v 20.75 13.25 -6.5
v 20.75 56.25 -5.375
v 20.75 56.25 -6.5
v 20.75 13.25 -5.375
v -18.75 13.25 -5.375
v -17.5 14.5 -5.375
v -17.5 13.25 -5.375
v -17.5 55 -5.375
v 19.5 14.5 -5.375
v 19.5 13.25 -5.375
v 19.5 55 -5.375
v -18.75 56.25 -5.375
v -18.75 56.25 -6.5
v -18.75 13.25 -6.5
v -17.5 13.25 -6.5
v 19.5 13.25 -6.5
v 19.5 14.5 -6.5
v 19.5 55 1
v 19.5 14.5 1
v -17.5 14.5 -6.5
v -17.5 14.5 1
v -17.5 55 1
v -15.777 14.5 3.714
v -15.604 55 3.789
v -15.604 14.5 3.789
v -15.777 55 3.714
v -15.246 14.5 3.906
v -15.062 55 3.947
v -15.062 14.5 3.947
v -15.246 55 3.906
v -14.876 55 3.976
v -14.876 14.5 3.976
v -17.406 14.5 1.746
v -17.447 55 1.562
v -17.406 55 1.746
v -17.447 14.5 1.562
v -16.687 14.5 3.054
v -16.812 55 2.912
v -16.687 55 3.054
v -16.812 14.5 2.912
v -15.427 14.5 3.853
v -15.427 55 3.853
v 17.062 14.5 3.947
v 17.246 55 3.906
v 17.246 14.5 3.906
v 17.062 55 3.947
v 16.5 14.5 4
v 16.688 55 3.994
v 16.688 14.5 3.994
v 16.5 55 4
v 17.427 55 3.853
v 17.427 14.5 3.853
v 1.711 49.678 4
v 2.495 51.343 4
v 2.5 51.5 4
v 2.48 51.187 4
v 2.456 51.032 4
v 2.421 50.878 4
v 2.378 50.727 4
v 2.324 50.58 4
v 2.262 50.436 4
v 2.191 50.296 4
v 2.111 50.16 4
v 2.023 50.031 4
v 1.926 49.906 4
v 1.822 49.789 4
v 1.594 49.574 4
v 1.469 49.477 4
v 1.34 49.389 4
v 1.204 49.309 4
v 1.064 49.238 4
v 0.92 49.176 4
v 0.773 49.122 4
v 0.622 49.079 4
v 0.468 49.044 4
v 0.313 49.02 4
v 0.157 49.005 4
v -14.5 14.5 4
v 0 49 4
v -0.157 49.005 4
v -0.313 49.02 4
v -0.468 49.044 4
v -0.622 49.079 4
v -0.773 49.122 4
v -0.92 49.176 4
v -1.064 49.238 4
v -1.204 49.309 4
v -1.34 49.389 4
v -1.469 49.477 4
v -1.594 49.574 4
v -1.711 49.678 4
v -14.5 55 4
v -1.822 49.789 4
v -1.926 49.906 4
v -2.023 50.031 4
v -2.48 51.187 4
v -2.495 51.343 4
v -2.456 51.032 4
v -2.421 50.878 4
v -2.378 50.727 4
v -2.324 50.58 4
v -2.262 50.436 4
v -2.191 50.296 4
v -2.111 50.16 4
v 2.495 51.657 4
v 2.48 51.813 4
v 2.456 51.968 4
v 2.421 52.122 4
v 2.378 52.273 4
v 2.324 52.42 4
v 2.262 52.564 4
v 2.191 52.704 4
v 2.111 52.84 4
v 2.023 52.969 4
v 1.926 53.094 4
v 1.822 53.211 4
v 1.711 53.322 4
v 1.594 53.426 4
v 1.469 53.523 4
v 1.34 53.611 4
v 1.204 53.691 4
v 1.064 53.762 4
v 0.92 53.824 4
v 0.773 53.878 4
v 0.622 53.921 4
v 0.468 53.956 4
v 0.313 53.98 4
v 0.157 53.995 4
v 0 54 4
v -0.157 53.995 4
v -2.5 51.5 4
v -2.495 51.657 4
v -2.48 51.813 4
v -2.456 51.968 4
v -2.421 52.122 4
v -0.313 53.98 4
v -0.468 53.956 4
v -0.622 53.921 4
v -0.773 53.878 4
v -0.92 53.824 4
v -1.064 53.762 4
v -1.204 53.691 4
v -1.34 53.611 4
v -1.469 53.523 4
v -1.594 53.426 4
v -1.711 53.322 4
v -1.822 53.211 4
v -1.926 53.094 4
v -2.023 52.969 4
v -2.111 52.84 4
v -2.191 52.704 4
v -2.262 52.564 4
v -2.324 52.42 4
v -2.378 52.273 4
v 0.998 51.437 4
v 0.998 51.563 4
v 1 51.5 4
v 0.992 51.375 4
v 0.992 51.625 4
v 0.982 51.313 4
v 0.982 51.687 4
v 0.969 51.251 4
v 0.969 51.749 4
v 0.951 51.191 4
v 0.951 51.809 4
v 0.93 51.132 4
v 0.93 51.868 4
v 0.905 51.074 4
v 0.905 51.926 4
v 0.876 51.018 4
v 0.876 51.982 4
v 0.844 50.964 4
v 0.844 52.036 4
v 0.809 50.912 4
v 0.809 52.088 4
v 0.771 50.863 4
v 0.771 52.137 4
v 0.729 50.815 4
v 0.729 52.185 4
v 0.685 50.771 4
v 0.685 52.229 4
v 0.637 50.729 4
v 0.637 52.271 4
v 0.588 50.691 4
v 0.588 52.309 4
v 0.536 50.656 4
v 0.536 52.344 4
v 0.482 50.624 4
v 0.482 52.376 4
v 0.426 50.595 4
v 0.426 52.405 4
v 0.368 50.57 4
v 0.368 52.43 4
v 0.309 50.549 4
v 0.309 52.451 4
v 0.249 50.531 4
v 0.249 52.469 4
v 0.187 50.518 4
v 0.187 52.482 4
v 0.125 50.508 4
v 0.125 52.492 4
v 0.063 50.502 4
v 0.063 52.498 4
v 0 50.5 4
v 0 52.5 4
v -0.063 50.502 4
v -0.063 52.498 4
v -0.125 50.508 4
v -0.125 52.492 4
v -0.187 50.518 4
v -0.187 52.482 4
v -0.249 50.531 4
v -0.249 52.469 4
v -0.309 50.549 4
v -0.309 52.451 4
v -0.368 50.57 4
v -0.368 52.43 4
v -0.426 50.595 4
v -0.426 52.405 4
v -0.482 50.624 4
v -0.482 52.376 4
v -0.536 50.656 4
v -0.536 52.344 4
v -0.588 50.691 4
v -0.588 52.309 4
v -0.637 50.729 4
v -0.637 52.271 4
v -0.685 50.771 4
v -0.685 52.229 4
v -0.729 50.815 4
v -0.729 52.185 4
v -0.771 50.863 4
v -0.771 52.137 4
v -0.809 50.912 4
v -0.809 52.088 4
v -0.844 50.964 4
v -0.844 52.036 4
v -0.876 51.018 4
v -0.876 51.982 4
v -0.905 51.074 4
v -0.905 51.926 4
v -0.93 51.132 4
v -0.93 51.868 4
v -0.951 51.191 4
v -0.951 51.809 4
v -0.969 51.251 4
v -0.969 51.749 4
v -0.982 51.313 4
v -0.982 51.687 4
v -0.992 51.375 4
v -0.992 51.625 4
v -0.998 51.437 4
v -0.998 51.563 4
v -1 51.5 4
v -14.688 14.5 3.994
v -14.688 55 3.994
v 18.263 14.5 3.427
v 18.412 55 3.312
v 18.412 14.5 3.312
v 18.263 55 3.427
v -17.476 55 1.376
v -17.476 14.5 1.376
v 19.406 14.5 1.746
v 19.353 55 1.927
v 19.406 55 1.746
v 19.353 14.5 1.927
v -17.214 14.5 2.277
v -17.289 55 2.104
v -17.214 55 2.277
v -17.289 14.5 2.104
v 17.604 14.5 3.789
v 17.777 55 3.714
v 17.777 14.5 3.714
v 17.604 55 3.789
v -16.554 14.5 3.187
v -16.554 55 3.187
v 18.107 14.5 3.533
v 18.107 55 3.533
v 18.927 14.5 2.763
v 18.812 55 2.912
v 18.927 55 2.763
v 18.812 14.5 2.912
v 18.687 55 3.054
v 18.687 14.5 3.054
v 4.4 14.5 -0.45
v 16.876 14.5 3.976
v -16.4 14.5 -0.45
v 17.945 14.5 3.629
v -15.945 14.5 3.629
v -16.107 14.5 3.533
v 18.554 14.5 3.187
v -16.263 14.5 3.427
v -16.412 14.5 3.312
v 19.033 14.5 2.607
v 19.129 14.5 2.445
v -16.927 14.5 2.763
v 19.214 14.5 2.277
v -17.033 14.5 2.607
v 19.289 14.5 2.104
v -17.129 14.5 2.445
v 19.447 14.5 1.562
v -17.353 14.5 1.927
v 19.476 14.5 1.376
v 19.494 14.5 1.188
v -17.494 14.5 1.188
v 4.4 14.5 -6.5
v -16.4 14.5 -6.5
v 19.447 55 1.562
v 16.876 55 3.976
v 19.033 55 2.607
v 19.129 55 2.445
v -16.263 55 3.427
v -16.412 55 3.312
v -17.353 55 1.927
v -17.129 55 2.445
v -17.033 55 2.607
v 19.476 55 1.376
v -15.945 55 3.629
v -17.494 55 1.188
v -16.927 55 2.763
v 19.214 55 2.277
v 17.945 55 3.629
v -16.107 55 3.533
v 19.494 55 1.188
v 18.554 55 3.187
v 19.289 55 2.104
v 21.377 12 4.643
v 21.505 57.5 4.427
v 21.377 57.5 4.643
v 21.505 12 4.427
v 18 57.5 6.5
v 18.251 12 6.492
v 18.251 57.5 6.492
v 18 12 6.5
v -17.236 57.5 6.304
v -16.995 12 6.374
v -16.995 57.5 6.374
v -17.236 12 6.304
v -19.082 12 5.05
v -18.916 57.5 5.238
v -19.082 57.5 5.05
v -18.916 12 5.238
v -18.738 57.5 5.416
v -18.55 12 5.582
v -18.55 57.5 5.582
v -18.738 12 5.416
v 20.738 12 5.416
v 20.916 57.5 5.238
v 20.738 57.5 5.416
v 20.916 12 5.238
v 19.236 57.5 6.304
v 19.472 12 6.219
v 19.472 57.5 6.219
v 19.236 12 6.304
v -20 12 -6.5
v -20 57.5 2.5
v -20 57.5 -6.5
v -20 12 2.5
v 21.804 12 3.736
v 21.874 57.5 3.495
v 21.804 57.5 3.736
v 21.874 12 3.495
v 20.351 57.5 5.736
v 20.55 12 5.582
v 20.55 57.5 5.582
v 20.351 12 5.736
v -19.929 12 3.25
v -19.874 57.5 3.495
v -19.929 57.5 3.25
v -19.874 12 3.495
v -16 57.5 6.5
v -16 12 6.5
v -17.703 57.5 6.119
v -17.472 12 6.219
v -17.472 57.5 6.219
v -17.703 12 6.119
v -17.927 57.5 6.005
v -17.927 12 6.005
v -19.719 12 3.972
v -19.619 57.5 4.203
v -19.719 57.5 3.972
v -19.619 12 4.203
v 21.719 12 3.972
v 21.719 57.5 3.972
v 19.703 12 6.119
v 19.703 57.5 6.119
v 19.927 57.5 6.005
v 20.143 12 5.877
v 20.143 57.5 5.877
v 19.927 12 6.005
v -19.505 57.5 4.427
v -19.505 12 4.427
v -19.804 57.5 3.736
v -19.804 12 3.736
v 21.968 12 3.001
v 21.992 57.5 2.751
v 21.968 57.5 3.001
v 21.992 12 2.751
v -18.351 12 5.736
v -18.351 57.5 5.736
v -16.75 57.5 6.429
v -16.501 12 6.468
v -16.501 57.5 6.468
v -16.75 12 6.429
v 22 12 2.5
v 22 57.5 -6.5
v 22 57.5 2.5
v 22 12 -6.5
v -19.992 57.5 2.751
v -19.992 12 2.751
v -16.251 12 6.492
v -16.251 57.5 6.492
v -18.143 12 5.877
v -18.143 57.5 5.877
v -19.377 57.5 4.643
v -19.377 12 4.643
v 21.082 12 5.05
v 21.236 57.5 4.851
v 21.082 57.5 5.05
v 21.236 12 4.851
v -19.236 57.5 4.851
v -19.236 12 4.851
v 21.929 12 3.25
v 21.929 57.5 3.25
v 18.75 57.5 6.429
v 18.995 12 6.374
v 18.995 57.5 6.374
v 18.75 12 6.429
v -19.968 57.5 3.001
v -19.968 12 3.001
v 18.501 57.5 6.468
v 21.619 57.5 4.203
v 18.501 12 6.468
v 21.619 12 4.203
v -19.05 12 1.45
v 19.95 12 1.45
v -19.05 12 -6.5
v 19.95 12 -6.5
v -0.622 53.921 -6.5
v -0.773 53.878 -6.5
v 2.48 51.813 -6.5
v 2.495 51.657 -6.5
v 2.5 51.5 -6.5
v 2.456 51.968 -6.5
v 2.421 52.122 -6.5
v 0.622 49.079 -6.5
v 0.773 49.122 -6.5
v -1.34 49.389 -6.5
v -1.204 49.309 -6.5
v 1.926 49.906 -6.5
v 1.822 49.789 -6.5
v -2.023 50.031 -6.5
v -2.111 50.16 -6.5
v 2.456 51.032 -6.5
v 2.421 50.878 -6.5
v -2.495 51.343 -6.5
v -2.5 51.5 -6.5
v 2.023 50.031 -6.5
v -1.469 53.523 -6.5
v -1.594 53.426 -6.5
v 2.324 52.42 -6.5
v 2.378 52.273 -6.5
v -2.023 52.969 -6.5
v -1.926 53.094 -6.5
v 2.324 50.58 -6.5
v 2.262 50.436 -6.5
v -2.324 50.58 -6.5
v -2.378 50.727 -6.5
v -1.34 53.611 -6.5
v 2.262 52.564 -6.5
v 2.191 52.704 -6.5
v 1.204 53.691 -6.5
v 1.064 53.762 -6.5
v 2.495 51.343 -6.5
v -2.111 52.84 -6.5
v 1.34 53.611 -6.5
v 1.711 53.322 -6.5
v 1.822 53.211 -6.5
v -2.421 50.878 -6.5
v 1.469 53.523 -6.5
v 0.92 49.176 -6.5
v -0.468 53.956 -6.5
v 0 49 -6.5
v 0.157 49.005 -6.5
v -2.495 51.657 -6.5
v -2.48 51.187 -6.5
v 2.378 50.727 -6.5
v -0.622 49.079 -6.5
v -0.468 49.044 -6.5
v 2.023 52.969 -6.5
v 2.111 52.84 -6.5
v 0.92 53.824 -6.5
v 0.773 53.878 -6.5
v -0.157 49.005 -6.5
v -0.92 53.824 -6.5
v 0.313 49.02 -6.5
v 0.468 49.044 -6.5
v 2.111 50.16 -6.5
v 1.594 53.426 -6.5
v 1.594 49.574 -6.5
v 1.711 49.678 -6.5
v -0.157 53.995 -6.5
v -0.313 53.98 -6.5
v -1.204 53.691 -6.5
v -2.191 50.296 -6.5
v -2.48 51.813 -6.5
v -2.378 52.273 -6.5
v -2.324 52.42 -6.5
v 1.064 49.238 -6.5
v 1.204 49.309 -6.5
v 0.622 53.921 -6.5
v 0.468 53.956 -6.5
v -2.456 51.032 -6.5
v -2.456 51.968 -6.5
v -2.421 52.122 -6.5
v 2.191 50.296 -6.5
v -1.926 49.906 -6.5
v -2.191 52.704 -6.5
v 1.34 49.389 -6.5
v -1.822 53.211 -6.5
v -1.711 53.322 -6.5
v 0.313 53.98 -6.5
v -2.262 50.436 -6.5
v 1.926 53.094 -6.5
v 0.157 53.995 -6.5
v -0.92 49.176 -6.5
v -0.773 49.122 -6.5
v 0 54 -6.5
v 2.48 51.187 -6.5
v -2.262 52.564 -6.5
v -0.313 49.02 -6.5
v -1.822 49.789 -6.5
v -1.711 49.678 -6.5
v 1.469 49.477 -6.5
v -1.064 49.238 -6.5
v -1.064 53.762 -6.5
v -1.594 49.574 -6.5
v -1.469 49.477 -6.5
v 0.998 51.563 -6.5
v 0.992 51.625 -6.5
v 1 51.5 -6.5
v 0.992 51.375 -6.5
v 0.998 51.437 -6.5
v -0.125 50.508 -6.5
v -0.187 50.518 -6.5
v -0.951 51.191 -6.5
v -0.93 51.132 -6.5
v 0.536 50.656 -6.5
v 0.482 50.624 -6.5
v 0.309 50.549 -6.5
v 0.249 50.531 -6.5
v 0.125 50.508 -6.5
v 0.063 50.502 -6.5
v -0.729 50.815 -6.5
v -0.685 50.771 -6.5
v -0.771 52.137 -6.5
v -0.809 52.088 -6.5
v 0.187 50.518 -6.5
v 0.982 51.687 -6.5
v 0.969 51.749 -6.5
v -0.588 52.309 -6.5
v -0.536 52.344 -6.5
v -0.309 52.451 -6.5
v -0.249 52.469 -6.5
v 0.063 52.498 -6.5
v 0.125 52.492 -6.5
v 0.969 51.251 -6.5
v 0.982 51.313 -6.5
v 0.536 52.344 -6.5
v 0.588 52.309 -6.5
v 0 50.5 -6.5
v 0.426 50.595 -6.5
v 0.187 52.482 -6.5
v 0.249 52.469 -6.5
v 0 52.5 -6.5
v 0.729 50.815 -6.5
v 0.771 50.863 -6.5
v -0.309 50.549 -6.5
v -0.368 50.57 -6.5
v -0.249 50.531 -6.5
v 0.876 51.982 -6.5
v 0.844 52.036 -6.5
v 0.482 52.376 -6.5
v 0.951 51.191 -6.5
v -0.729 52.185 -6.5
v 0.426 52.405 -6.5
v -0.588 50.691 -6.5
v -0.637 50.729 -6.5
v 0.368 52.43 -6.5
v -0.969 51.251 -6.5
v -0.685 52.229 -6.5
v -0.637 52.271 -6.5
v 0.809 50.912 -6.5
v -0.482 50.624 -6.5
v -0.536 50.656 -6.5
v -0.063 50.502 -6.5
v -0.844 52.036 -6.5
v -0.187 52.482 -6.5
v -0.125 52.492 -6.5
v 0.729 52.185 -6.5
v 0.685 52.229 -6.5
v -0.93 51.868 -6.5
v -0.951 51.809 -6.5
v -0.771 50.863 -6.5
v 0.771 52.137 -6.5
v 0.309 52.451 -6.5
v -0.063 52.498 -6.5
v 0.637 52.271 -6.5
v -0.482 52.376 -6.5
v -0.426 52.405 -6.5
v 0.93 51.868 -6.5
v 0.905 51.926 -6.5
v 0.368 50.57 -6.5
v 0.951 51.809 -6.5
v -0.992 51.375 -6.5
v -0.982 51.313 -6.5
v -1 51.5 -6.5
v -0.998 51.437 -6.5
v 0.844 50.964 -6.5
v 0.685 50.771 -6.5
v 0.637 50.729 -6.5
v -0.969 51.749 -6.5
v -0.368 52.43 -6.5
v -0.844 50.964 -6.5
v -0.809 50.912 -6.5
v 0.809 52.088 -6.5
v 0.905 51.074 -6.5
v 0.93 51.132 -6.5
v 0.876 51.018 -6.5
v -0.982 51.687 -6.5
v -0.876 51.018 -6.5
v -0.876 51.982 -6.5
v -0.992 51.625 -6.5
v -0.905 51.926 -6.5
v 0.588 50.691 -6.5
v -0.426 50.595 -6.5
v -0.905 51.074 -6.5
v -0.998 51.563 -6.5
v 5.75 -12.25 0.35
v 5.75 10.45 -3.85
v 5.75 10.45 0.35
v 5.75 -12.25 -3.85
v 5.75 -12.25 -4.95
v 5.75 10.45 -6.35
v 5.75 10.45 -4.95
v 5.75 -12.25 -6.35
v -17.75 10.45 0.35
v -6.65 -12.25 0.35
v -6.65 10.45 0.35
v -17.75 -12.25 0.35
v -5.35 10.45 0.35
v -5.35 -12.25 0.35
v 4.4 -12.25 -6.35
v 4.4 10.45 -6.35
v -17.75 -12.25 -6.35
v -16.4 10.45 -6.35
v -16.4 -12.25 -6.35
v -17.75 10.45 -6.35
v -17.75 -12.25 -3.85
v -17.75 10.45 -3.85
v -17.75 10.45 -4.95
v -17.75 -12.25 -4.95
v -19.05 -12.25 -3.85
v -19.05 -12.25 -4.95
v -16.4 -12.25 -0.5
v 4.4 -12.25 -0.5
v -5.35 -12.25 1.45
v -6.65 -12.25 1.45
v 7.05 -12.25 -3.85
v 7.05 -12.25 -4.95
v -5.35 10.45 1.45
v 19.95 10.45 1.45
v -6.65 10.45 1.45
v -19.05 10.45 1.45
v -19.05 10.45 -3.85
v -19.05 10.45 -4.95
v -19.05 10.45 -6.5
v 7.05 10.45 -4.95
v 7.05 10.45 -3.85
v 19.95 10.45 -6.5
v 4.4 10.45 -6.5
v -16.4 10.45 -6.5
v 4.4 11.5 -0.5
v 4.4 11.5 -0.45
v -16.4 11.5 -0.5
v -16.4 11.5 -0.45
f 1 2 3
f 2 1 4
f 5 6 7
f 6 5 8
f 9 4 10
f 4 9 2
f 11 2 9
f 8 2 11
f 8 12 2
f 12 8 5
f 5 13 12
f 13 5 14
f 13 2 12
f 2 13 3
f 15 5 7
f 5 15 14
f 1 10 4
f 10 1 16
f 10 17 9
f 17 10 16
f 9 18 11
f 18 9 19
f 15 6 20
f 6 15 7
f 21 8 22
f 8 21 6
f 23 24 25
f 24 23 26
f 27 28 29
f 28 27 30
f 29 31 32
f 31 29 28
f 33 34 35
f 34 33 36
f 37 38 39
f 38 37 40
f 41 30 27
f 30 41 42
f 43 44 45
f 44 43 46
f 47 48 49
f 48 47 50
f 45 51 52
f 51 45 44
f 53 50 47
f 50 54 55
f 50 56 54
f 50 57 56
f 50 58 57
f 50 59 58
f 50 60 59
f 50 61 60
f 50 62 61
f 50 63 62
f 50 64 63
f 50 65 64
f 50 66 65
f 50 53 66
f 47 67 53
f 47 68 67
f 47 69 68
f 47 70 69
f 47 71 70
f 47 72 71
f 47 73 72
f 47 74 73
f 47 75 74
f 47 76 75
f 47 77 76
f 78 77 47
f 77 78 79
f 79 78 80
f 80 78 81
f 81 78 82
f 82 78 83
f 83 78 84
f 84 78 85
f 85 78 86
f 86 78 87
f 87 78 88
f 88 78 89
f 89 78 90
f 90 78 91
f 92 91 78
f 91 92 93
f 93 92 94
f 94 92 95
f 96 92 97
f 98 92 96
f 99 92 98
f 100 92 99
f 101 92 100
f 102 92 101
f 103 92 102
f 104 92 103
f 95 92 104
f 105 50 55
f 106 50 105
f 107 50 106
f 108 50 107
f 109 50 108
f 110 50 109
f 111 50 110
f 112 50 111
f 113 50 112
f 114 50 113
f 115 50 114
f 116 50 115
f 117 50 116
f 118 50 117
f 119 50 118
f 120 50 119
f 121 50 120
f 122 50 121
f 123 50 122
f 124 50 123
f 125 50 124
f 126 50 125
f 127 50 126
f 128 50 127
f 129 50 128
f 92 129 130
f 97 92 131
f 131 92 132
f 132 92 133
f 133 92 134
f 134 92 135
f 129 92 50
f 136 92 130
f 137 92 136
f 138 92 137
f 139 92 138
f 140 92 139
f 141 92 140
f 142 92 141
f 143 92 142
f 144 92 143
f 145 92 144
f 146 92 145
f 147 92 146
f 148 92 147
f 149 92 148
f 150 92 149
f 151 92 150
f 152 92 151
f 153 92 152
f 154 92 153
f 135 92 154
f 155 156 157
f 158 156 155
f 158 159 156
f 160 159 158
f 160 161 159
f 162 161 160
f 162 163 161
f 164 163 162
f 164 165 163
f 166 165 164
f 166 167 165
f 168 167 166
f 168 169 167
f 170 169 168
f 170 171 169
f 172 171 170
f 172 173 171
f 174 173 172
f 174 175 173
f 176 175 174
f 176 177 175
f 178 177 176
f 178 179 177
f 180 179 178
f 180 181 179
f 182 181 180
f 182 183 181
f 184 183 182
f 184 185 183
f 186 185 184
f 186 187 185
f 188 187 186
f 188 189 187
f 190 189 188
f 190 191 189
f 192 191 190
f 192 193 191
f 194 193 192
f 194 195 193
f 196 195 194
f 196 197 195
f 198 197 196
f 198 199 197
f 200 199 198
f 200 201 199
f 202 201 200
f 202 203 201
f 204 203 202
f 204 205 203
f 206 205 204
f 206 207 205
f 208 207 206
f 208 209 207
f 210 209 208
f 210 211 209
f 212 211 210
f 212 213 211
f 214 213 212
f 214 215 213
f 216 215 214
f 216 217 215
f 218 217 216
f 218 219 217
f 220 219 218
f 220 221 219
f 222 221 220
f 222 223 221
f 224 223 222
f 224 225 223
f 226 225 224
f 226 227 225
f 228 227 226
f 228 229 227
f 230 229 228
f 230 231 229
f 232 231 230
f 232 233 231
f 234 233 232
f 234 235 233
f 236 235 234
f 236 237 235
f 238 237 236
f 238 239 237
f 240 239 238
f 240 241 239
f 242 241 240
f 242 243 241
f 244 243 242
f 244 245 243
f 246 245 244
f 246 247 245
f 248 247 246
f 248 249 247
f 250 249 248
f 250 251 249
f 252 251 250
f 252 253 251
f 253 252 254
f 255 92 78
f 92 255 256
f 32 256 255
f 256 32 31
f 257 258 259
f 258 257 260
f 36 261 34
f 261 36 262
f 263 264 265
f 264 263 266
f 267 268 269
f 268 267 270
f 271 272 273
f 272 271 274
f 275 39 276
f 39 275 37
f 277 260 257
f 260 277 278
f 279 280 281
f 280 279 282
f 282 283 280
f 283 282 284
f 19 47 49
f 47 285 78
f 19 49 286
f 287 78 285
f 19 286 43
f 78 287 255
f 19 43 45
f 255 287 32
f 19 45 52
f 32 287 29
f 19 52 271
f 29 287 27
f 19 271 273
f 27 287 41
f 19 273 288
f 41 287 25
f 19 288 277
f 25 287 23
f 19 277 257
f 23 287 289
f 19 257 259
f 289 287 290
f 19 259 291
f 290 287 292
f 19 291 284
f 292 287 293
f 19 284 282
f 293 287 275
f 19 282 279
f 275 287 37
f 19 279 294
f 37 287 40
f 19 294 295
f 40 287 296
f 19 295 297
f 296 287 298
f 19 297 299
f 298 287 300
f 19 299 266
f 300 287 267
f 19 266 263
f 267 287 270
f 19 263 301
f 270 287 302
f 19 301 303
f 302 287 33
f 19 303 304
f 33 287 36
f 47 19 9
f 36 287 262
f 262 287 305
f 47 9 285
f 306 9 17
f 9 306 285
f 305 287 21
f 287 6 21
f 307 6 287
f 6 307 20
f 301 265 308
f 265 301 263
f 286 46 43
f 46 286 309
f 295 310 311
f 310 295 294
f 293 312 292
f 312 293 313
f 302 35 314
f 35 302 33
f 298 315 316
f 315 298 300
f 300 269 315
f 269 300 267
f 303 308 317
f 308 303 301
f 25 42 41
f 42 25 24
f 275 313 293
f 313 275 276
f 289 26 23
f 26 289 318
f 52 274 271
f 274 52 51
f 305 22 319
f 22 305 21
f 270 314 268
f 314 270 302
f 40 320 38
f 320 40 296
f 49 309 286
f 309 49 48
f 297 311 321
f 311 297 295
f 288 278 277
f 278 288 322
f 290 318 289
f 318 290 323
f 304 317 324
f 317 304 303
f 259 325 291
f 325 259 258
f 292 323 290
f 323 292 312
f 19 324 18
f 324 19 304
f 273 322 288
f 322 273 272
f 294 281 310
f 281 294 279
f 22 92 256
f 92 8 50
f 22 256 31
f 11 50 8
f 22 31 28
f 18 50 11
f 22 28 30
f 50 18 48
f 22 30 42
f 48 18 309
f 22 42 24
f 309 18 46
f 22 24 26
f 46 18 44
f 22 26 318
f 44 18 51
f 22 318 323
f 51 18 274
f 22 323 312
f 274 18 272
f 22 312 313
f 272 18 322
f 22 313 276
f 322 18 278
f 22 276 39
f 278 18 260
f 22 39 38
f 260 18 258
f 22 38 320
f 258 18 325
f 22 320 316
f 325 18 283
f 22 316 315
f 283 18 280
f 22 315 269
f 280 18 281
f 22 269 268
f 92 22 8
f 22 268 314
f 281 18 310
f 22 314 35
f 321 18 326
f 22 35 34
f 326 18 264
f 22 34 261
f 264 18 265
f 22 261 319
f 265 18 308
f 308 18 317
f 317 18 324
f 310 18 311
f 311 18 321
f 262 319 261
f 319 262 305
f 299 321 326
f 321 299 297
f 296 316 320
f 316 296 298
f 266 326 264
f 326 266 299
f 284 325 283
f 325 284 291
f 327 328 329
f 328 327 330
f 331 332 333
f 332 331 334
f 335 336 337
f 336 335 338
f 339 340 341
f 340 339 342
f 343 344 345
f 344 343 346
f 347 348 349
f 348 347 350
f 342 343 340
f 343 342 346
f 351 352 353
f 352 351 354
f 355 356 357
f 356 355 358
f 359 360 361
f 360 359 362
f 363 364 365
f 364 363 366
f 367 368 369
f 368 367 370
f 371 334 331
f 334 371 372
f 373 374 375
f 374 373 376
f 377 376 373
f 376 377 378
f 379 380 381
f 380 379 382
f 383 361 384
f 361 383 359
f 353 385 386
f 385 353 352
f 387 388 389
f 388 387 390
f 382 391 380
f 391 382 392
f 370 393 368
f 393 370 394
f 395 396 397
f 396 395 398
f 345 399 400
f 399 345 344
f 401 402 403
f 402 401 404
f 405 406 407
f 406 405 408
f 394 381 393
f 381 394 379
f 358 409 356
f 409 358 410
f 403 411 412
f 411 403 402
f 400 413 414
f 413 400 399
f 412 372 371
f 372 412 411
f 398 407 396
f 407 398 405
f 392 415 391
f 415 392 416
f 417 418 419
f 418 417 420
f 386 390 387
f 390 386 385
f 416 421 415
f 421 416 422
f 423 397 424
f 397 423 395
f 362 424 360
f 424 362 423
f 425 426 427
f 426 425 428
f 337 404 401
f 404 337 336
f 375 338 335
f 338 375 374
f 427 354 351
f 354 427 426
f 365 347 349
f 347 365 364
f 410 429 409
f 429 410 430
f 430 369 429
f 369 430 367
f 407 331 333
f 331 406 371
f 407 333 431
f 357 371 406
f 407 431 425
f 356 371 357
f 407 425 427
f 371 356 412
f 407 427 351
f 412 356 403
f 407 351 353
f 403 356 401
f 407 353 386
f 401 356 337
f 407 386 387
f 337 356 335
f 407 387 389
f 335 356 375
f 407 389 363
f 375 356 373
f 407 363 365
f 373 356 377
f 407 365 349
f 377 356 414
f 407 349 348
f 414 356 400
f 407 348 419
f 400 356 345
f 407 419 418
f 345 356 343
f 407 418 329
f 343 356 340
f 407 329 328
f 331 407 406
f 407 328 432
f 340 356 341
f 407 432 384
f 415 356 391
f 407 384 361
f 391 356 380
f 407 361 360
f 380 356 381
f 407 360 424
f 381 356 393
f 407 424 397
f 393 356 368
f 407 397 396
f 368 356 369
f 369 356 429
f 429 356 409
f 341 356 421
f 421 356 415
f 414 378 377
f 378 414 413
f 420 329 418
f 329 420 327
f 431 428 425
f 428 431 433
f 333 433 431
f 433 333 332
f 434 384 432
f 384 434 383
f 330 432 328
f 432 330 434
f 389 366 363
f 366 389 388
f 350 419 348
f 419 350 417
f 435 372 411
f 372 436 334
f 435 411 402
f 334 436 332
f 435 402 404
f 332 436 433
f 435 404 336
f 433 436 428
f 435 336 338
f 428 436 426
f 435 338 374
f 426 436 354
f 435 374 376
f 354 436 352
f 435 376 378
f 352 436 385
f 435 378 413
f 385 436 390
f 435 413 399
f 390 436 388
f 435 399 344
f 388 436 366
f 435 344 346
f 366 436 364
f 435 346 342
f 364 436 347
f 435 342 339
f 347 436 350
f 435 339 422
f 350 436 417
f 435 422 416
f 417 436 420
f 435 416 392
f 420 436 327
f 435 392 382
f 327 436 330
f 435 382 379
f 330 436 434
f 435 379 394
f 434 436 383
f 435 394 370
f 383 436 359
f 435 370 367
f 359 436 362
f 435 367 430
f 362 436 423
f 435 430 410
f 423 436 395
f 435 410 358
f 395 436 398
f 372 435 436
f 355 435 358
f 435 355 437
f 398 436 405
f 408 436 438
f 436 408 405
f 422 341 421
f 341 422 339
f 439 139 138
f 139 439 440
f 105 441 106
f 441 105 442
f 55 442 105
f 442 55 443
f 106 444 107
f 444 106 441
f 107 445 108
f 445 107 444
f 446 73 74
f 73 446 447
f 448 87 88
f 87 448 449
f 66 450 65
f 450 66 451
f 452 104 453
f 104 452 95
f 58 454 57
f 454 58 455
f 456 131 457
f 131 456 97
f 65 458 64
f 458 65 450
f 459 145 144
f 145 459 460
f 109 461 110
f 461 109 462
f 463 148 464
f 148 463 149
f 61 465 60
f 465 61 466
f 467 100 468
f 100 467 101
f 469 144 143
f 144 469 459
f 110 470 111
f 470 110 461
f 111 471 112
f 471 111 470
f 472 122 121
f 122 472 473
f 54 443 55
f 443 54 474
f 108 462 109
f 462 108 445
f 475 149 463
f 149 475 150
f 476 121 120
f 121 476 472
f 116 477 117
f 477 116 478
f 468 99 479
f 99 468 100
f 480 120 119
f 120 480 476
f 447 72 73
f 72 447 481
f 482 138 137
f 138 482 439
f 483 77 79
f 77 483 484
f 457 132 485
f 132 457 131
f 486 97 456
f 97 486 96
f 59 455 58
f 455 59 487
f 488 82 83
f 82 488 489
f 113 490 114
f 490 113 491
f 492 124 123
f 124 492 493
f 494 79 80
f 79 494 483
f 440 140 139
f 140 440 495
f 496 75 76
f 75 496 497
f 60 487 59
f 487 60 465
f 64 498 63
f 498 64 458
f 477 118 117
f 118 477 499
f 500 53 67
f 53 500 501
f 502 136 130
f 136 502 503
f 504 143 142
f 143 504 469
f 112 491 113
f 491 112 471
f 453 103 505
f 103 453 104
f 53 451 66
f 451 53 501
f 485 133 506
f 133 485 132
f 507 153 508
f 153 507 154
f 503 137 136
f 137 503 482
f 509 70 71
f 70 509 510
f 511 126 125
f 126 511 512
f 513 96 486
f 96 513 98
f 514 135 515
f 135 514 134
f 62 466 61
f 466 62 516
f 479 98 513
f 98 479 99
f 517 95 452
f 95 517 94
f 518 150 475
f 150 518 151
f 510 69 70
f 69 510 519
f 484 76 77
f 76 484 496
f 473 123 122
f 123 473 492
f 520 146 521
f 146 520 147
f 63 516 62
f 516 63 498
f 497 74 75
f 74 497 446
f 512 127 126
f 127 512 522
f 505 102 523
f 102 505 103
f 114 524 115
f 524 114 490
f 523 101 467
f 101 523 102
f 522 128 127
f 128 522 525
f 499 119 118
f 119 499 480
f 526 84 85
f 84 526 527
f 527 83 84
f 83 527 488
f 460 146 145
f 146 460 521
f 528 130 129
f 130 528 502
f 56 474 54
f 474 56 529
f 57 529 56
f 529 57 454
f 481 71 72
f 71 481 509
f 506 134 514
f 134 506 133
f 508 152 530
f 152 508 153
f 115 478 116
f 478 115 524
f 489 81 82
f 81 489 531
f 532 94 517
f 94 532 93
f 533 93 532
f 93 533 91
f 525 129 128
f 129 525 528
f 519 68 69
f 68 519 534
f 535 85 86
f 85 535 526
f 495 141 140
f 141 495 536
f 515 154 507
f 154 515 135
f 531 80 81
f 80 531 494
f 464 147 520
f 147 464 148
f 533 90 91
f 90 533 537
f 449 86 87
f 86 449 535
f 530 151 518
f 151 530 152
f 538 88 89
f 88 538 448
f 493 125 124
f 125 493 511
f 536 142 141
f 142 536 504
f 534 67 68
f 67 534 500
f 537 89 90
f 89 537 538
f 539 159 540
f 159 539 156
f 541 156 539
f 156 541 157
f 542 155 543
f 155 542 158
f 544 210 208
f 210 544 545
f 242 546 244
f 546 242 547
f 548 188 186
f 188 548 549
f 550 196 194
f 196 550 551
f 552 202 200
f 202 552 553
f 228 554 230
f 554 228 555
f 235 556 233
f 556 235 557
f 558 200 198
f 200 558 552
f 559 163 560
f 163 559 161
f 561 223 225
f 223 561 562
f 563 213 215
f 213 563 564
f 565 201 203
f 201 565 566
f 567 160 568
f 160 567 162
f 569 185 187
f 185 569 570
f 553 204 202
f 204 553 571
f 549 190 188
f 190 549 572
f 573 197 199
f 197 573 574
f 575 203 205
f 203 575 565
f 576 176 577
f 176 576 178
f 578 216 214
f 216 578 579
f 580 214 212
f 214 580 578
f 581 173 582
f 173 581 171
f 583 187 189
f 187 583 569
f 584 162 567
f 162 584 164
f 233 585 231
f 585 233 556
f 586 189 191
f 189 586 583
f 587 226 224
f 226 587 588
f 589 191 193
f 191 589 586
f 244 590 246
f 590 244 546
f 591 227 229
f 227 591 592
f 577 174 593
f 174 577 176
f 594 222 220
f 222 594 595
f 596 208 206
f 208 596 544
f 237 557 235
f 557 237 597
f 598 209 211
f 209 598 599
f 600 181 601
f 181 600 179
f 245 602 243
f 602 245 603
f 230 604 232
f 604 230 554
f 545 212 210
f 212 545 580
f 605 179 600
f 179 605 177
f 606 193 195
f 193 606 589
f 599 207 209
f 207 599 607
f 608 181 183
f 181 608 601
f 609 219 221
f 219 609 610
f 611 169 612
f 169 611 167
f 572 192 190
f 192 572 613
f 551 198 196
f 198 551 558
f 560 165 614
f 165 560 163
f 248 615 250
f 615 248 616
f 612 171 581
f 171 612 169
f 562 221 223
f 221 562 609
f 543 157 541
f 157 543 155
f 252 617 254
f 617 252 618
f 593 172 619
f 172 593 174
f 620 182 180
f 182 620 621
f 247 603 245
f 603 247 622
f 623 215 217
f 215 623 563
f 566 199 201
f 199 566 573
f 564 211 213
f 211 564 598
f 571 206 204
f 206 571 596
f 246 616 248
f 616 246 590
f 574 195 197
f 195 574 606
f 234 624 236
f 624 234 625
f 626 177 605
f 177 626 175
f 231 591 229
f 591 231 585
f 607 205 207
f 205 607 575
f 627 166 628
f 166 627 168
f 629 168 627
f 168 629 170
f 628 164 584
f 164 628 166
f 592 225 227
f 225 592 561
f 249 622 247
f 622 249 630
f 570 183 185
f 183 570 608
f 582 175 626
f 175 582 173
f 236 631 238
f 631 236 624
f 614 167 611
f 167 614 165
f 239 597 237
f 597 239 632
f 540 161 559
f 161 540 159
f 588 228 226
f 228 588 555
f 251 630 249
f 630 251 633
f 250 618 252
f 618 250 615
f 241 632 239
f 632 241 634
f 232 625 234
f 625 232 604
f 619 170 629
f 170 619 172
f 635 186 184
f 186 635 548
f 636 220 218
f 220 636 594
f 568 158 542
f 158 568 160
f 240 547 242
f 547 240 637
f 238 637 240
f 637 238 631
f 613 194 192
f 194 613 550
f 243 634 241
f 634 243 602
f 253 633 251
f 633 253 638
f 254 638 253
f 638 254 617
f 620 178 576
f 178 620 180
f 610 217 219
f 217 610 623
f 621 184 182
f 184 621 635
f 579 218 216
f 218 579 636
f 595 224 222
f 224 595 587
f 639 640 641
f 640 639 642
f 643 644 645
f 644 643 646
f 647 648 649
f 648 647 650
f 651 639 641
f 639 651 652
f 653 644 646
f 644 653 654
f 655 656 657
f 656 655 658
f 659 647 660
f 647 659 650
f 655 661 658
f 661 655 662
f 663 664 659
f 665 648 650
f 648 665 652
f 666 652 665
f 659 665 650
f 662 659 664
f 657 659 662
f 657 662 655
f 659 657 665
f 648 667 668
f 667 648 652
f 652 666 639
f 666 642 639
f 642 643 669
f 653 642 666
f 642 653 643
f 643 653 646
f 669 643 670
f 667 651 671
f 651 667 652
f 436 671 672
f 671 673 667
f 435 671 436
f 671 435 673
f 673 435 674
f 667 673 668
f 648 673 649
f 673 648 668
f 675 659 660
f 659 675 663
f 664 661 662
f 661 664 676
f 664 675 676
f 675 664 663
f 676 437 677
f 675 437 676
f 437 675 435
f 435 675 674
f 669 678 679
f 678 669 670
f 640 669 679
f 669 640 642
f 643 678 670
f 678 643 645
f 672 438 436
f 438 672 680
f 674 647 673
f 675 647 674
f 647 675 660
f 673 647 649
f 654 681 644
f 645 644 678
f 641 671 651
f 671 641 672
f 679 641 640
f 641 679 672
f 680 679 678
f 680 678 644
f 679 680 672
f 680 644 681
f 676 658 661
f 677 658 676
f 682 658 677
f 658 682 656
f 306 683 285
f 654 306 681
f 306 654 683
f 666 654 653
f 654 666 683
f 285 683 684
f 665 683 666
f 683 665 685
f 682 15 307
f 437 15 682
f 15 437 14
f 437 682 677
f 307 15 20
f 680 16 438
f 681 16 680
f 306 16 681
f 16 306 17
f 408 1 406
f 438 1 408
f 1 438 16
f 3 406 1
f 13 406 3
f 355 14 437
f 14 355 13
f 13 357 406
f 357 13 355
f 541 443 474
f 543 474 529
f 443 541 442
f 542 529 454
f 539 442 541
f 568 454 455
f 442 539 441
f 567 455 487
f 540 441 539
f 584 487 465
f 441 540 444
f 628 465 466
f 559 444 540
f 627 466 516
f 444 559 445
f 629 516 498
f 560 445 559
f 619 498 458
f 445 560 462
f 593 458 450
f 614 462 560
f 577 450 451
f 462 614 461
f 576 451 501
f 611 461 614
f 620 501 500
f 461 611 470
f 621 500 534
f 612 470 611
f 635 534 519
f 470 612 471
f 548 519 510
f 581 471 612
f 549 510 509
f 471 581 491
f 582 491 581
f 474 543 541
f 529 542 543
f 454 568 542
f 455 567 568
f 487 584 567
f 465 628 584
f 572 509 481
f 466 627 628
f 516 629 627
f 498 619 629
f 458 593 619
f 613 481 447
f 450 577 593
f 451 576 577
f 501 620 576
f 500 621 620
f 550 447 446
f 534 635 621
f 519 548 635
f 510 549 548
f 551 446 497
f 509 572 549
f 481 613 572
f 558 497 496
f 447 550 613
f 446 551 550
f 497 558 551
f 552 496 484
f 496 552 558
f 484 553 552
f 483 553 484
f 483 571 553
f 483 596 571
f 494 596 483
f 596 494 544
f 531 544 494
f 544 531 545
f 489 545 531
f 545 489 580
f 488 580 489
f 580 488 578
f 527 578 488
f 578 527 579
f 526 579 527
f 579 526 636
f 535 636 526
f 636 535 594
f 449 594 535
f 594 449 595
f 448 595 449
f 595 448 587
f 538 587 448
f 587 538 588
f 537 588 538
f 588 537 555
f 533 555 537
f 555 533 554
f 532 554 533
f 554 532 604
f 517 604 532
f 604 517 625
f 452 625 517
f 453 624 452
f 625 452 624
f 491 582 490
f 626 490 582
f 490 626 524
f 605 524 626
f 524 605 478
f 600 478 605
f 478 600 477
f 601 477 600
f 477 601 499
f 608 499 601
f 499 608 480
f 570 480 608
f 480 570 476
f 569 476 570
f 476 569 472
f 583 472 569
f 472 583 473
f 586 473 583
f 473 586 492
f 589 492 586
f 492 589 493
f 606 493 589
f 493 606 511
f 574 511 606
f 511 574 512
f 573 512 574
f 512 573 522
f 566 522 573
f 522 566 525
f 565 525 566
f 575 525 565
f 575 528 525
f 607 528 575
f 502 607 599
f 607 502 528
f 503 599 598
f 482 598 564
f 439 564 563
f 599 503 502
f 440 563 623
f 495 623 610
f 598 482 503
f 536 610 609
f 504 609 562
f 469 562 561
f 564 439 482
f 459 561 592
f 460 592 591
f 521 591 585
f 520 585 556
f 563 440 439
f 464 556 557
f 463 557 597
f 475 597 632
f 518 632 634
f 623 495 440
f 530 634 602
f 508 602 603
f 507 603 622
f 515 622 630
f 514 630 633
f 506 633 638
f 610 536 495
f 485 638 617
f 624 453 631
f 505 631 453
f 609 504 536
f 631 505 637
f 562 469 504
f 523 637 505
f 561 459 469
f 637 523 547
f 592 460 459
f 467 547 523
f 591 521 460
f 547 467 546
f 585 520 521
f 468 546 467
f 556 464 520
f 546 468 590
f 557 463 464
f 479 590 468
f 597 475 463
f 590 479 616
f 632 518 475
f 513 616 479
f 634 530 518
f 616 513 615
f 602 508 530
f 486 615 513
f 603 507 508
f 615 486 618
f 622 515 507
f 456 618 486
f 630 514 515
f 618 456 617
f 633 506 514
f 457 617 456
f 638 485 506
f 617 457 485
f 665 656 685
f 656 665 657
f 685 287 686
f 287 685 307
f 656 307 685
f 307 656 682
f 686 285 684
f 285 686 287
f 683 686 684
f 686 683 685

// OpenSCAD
// Psion Organiser top slot case part
//

// Render the box or the lid
box = 1;
lid = 0;

z_h = 6.7;
z_cut = 5.9;

box_x = 42.0;
box_y = 45.5;
box_z = 21;
box_shift = 12;

tongue_shift_z = -3;
tongue_shift_x = -6; 
th = 2.5;
pillar_r = 2;

screw_h_r = 1.5-box*0.6;

pcb_runner_th = 2;

// Pillars for lid screws
module screw_pillar()
{
    difference()
    {
      rotate([90, 0, 0])
      cylinder(r=pillar_r+0.51, h= box_y, center=true, $fn=100);  
    }
}

countersunk = 1;

module screw_hole()
{
    //rotate([0, 0, 0])
    //cylinder(r=screw_h_r, h= box_y-th*2, center=true, $fn=100);  

    if( countersunk )
    {
        translate([0, 0, th/2-0.1])
        rotate([0, 0, 0])
        cylinder(r2=2.5/2, r1=4/2, h = th, center=true, $fn=100);  
    }
    else
    {
        translate([0, box_y/2-th*2.7+th+1.4, 0])
        rotate([0, 0, 0])
        cylinder(r2=screw_h_r, r1=screw_h_r*1.0, h = th*2.5, center=true, $fn=100);  
    }
}

pillar_shift_x_upper = 2;
pillar_shift_x_lower = 11.0;

pillar_shift_z = 0.5;


psx_u = pillar_shift_x_upper;
psx_l = pillar_shift_x_lower;

psz = pillar_shift_z;

module screw_pillars()
{
    
  translate([-box_x/2+pillar_r+psx_l, box_y/2+box_shift, -box_z/2+pillar_r+psz])
  screw_pillar();

  translate([ box_x/2-pillar_r-psx_l, box_y/2+box_shift, -box_z/2+pillar_r+psz])
  screw_pillar();

  translate([ box_x/2-pillar_r-psx_u, box_y/2+box_shift,  box_z/2-pillar_r-psz])
  screw_pillar();

  translate([-box_x/2+pillar_r+psx_u, box_y/2+box_shift,  box_z/2-pillar_r-psz])
  screw_pillar();

}

module screw_holes()
{
  translate([-box_x/2+pillar_r+psx_l, box_y/2+box_shift, -box_z/2+pillar_r+psz])
  screw_hole();

  translate([ box_x/2-pillar_r-psx_l, box_y/2+box_shift, -box_z/2+pillar_r+psz])
  screw_hole();

  translate([ box_x/2-pillar_r-psx_u, box_y/2+box_shift,  box_z/2-pillar_r-psz])
  screw_hole();

  translate([-box_x/2+pillar_r+psx_u, box_y/2+box_shift,  box_z/2-pillar_r-psz])
  screw_hole();

}

module rounded_cuboid(x, y, z, rd)
{
  scale([1, 0.5, 1])
  translate([-x/2, 0, -z/2])
  minkowski()
    {  
    cube([x-rd-rd, y, z-rd-rd], center=true);
    translate([x/2, 0, z/2])
        rotate([90,0,0])
      cylinder(h=y, r=rd, $fn=100, center=true);
    }
}

module truncated_cuboid(x, y, z, angle, z_height)
{
difference()
    {
        cube([x, y, z], center=true);
        
        cube([2*x, 2*y, z], center=true);
        
    }
}

module box_prism(x, y, z, x_h, z_h)
{
translate([0, y/2, 0])
rotate([90, 0, 0])
linear_extrude(y) 
  {
  polygon(
    points = 
      [
      [-x/2,      z/2],
      [ x/2,      z/2],
      [ x/2,     -z/2+z_h],
      [ x/2-x_h, -z/2],
      [-x/2+x_h, -z/2],
      [-x/2,     -z/2+z_h]
      ]
      );
  }
 }

 
module rounded_truncated_cuboid(x, y, z, rd)
{
  scale([1, 0.5, 1])
  translate([-x/2, 0, -z/2])
  minkowski()
    {  
        
    //cube([x-rd-rd, y, z-rd-rd], center=true);
    box_prism(x-rd-rd, y, z-rd-rd, 7, 3.5);    
        
    translate([x/2, 0, z/2])
        rotate([90,0,0])
      cylinder(h=y, r=rd, $fn=100, center=true);
    }
}

gask_th = th/2;

module lid_gasket()
{
 difference()
     {
         cube([box_x,           box_y-gask_th, gask_th],   center=true);
         translate([0, -gask_th/2, 0])
         cube([box_x-gask_th*2, box_y-gask_th*2+0.1, gask_th+.1], center=true);
     }
 }

 
module box_gasket()
 {
 difference()
     {
         cube([box_x-gask_th*2,           box_y-gask_th*2, gask_th],   center=true);
         translate([0, -gask_th, 0])
         cube([box_x-gask_th*4, box_y-gask_th*3+0.1, gask_th+.1], center=true);
     }
 }

module screw_post()
 {
     difference()
     {
     cylinder(h=box_z, r=2.5, $fn=100);
     if( box)
       {
       cylinder(h=box_z+0.5, r=1, $fn=100);
       }
     if( lid)
       {
       cylinder(h=box_z+0.5, r=2.5/2, $fn=100);
       }
       
     }
 }
 
 
if(lid)
{
translate([gask_th-0.25, box_y/2+12.65, -6])
lid_gasket();
}


module box_pre()
{
    //cube([box_x, box_y,  box_z], center=true);
    rounded_cuboid(box_x, box_y, box_z, 4);
}

if(0)
{
translate([0, -100, 0])
{
    %cube([box_x, box_y,  box_z], center=true);
    rounded_truncated_cuboid(box_x, box_y, box_z, 4);
}
}

module box_rem()
{
   //cube([box_x-2*th, box_y-2*th,  box_z-2*th], center=true);
   rounded_cuboid(box_x-2*th, box_y-2*th, box_z-2*th, 3);
    
    if(box)
{
    translate([0, 0, -2])
//translate([0, box_shift+box_y-th-th*.75, 0])
box_gasket();
}

    if(lid)
{
    translate([0, 0, -2])
//translate([0, box_shift+box_y-th-th*.75, 0])
lid_gasket();
}

   //screw_holes();        
}

module box()
{
   difference()
    {
        box_pre();
        box_rem();
    }
}

module pcb_runner()
{
    difference()
    {
       cube([pcb_runner_th, box_y, pcb_runner_th*3], center=true);
       cube([pcb_runner_th+0.1, box_y, pcb_runner_th], center=true);
    }

}


module pre()
{

    //screw_pillars();
    translate([1, box_y/2+box_shift, -4])

    box();
    
    translate([0, 10.5+41, -box_z/2-4])
    screw_post();

    
    translate([tongue_shift_x, 0, tongue_shift_z])
    {   
        // -----   Tongue
        cube([23.5, 24.5, z_h], center=true);
    
        translate([0, 0, (z_h+1.1)/2])
        cube([1.3, 24.5, 1.1], center=true);
    
        translate([-23.5/2-1.3/2, 0, -z_h/2+1.1/2+1.4])
        cube([1.3, 24.5, 1.1], center=true);
    
        translate([23.5/2+1.3/2, 0, -z_h/2+1.1/2+1.4])
        cube([1.3, 24.5, 1.1], center=true);
        // -----

    }
       
// Mount edges  
    translate([0.45, 11.25, -4.8])
    cube([39, 1.6, 12.5], center=true);
           
}

z_cut2 = 8.9;

module rem()
{
    translate([tongue_shift_x, 0, tongue_shift_z])
    {   
        translate([0, 3, -z_h/2+z_cut/2-0.1])
        cube([20.8, 25+6, z_cut+0.1], center=true);
    }

    translate([tongue_shift_x, 10, -z_cut2/2])
    {   
        translate([0, 3, -z_h/2+z_cut/2-0.1])
        cube([20.8, 3.0, z_cut2+0.1], center=true);
    }

    if(lid)
    {
      translate([0, 10.5+41, -box_z/2-4])
      screw_hole();
    }
    
}


module topslot()
{
    
   difference()
    {
        pre();
        rem();
        difference()
          {
           //screw_holes();
           }

    }
        
    // PCB runners  
    if(0)
    {
    translate([0, box_y/2+box_shift, tongue_shift_z])
       {
           translate([box_x/2-pcb_runner_th-th/2, 0, -z_h+pcb_runner_th*1.5])
           pcb_runner();
       }

    translate([0, box_y/2+box_shift, tongue_shift_z])
       {
           translate([-box_x/2+pcb_runner_th+th/2, 0, -z_h+pcb_runner_th*1.5])
           pcb_runner();
       }
   }
}


difference()
{
    topslot();

translate([1.3, 34.5, -5.5])
%small_pcb();
    
    if( box )
    {
    // Chop the top off the box so contents can get in
    translate([0, box_y/2, -17])
    cube([box_x*2, box_y*2, box_z], center=true);
    }

    if( lid )
    {
    // Chop the box off so we get the lid
    translate([0, box_y/2, -17+box_z])
    cube([box_x*2, box_y*2, box_z], center=true);
    }
    
}

sp_x = 40;
pcb_th = 3.0;

module small_pcb()
{
cube([sp_x, 40, pcb_th], center=true);

translate([-sp_x/2+2.5+20/2, -40/2-4/2, 1.5])
cube([20, 4, pcb_th], center=true);
}



// PCB test
//translate([0,40, 0])
//cube([72, 37, 1.6],center=true);

//translate([0,30,00])
//cube([1,1,1], center=true);
